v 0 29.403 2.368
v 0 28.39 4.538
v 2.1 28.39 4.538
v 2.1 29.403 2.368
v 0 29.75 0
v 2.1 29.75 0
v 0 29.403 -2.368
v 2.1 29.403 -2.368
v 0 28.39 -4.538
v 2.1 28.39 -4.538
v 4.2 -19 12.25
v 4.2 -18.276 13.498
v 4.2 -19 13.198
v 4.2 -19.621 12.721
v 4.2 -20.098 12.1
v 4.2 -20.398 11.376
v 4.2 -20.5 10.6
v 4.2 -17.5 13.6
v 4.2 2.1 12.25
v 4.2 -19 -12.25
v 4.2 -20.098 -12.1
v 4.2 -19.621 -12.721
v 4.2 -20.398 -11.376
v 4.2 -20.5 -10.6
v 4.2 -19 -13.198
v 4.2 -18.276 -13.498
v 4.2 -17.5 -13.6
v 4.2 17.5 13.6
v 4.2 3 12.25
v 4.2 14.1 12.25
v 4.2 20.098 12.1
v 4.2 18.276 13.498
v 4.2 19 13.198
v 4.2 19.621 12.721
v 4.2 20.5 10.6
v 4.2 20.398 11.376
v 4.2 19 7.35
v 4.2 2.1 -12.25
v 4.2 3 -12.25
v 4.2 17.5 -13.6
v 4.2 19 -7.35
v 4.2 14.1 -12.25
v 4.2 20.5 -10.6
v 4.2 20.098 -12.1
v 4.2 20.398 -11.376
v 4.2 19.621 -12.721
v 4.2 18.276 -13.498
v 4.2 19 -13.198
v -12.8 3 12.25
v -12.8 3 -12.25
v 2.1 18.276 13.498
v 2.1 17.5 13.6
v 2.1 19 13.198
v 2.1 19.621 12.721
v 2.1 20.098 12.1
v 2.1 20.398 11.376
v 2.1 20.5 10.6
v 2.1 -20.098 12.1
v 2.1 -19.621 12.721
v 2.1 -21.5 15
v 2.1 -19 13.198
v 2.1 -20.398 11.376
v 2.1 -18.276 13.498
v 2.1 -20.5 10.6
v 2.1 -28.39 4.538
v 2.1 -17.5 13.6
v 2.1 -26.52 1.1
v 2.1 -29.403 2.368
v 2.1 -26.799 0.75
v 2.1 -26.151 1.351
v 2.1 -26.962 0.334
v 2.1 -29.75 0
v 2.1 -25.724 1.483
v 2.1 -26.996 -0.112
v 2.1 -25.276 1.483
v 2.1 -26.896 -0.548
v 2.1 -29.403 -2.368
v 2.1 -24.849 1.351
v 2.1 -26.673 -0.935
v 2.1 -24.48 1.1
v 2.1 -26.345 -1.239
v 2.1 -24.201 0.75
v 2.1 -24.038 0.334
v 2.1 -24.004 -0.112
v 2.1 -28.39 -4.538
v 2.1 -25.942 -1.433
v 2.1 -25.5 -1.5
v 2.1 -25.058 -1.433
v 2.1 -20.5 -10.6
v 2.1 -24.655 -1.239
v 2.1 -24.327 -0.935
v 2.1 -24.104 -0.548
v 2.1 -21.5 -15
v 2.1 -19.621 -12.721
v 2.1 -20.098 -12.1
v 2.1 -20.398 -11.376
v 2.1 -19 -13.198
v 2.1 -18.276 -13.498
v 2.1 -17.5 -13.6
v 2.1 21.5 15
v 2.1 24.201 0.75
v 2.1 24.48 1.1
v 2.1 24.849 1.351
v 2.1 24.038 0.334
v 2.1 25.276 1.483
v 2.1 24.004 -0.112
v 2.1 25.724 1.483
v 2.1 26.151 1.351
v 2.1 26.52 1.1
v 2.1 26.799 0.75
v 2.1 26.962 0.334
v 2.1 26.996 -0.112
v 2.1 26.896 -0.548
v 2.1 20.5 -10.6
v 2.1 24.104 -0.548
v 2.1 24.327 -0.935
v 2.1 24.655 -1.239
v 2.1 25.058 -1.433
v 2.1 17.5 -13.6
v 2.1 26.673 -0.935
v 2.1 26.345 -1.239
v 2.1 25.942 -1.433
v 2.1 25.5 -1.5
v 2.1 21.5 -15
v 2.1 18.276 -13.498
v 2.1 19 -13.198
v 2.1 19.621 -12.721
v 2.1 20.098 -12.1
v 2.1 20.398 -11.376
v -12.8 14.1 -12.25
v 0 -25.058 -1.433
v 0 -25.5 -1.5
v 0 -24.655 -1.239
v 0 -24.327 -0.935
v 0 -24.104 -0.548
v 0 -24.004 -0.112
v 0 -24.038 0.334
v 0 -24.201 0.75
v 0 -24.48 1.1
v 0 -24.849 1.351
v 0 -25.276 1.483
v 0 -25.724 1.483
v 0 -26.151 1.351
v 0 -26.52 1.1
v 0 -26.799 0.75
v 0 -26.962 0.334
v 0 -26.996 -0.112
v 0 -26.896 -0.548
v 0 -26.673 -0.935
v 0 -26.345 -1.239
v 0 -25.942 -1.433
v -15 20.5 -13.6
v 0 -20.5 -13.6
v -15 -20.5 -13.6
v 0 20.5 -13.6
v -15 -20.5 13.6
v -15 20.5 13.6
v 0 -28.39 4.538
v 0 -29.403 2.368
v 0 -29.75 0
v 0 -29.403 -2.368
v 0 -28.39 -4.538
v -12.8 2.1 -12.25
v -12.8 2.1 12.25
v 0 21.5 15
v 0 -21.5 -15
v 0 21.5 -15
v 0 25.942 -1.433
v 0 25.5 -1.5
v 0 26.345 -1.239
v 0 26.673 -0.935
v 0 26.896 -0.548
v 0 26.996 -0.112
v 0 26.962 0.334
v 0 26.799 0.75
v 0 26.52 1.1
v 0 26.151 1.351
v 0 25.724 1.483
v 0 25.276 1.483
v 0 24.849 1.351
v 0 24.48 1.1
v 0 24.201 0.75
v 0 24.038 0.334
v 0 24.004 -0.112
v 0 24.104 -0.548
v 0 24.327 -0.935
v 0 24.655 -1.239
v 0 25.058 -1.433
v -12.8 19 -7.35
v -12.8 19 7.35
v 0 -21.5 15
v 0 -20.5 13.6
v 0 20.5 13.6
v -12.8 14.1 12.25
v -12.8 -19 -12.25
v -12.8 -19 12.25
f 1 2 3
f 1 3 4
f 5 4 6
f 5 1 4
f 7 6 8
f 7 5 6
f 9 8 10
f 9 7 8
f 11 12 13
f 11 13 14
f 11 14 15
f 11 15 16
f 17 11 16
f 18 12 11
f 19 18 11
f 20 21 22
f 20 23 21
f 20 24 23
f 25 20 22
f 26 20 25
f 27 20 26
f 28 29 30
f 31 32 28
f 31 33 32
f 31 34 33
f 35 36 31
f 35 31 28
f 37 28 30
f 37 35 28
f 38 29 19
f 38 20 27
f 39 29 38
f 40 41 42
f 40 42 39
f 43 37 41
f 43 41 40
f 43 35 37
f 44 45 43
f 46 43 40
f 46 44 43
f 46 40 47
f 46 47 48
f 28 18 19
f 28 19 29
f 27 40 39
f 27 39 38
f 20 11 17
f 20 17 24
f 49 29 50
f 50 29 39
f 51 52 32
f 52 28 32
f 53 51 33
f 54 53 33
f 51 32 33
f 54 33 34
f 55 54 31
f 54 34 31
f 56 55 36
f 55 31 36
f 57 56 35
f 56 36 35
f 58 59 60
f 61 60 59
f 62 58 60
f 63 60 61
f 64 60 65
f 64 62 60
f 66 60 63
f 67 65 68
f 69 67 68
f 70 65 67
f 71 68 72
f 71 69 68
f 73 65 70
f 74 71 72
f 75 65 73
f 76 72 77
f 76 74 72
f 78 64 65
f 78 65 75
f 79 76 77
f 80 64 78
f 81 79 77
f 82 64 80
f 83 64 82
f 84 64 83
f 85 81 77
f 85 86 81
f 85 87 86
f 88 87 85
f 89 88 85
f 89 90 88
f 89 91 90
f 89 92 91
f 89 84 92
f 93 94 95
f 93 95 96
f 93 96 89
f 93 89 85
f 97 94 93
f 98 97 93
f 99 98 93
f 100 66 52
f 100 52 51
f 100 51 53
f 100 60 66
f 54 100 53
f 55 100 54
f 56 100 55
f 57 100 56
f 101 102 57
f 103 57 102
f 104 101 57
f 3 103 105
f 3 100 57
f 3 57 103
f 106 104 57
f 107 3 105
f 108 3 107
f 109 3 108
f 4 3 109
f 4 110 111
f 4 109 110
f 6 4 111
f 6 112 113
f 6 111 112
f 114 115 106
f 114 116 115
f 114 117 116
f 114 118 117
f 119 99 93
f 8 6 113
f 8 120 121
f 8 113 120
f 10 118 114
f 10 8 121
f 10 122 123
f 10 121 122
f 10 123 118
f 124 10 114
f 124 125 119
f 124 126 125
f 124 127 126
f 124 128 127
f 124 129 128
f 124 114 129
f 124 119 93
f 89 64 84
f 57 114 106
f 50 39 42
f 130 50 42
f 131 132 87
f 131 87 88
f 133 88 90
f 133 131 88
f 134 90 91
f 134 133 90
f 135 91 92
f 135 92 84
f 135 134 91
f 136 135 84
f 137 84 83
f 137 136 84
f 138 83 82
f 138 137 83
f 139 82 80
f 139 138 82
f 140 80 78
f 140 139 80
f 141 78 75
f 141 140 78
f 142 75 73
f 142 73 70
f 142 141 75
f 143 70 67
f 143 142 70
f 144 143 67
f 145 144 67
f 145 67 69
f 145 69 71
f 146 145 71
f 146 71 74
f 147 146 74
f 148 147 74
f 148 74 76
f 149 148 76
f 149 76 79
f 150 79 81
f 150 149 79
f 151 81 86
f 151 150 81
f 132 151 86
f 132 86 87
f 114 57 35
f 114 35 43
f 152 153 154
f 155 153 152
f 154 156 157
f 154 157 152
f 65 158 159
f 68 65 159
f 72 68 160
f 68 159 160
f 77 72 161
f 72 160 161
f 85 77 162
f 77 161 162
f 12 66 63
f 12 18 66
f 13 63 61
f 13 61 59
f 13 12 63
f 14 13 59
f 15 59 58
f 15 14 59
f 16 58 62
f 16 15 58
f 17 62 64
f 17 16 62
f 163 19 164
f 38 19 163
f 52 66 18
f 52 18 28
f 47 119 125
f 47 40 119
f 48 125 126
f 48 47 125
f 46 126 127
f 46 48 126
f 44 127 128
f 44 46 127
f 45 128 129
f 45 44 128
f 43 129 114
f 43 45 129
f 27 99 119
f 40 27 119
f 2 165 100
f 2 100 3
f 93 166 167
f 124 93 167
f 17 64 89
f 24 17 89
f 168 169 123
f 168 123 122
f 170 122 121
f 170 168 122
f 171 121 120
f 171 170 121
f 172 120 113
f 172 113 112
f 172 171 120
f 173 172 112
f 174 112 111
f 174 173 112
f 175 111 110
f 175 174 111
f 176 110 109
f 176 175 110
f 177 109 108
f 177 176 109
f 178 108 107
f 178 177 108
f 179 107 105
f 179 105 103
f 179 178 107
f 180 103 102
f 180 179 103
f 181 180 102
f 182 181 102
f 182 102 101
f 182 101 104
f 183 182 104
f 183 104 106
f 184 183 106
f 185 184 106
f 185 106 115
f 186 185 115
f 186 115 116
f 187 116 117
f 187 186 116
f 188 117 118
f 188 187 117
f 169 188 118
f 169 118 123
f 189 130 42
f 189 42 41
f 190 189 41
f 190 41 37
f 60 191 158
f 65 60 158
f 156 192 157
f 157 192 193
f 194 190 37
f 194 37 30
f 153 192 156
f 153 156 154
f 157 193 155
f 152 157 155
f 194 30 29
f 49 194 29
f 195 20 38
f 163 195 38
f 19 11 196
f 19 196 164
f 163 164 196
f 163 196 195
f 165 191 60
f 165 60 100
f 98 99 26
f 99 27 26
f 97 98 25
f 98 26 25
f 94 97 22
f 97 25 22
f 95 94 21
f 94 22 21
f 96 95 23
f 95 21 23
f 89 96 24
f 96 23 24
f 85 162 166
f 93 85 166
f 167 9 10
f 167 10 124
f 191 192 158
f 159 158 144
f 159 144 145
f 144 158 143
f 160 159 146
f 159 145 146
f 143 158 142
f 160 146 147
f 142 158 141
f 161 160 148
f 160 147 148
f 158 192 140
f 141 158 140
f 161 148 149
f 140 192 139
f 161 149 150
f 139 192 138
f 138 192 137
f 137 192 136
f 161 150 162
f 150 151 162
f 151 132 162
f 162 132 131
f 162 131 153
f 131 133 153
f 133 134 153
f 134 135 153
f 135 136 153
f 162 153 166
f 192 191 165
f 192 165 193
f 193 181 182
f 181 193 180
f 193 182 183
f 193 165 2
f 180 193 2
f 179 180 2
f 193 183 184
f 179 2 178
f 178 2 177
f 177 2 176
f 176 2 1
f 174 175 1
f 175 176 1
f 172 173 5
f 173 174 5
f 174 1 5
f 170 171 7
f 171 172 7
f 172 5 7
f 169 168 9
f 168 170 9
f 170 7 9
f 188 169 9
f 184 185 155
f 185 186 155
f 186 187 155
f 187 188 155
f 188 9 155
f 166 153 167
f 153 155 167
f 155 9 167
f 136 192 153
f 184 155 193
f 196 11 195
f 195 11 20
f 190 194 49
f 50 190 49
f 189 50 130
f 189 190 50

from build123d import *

# Parameters (mm, degrees)
SKETCH1_R           = 1.5
SKETCH1_W           = 30
SKETCH1_H           = 43
SKETCH1_W_2         = 27.2
SKETCH1_H_2         = 41
SKETCH1_W_3         = 24.5
SKETCH1_H_3         = 21.1
BOSS_EXTRUDE1_DEPTH = 2.1
BOSS_EXTRUDE2_START = 2.1
SKETCH1_3_W         = 27.2
SKETCH1_3_H         = 41
SKETCH1_3_W_2       = 24.5
SKETCH1_3_H_2       = 21.1
BOSS_EXTRUDE2_DEPTH = 2.1
FILLET1_R           = 3
SKETCH1_4_W         = 27.2
SKETCH1_4_H         = 41
SKETCH1_4_W_2       = 24.5
SKETCH1_4_H_2       = 21.1
BOSS_EXTRUDE3_DEPTH = 15
BOSS_EXTRUDE4_START = -15
SKETCH1_5_W         = 24.5
SKETCH1_5_H         = 21.1
BOSS_EXTRUDE4_DEPTH = 2.2


with BuildPart() as part:
    # Sketch1 → Boss-Extrude1 (new body)
    # profile 1 of 4: a face of its own
    with BuildSketch(Plane(origin=(0, 0, 0), x_dir=(0, 0, -1), z_dir=(1, 0, 0))):
        with BuildLine():
            ThreePointArc((-4.5375, 28.390108399), (0, 29.75), (4.5375, 28.390108399))
            Line((4.5375, 28.390108399), (15, 21.5))
            Line((15, 21.5), (-15, 21.5))
            Line((-15, 21.5), (-4.5375, 28.390108399))
        make_face()
        with Locations((0, 25.5)):
            Circle(SKETCH1_R, mode=Mode.SUBTRACT)
    # profile 2 of 4: a face of its own
    with BuildSketch(Plane(origin=(0, 0, 0), x_dir=(0, 0, -1), z_dir=(1, 0, 0))):
        Rectangle(SKETCH1_W, SKETCH1_H)
        Rectangle(SKETCH1_W_2, SKETCH1_H_2, mode=Mode.SUBTRACT)
    # profile 3 of 4: a face of its own
    with BuildSketch(Plane(origin=(0, 0, 0), x_dir=(0, 0, -1), z_dir=(1, 0, 0))):
        Rectangle(SKETCH1_W_2, SKETCH1_H_2)
        Polygon((-12.25, 14.1), (-12.25, 3), (12.25, 3), (12.25, 14.1), (7.35, 19), (-7.35, 19), align=None, mode=Mode.SUBTRACT)
        with Locations((0, -8.45)):
            Rectangle(SKETCH1_W_3, SKETCH1_H_3, mode=Mode.SUBTRACT)
    # profile 4 of 4: a face of its own
    with BuildSketch(Plane(origin=(0, 0, 0), x_dir=(0, 0, -1), z_dir=(1, 0, 0))):
        with BuildLine():
            Line((-15, -21.5), (-4.5375, -28.390108399))
            ThreePointArc((-4.5375, -28.390108399), (0, -29.75), (4.5375, -28.390108399))
            Line((4.5375, -28.390108399), (15, -21.5))
            Line((15, -21.5), (-15, -21.5))
        make_face()
        with Locations((0, -25.5)):
            Circle(SKETCH1_R, mode=Mode.SUBTRACT)
    extrude(amount=BOSS_EXTRUDE1_DEPTH)

    # Sketch1<3> → Boss-Extrude2 (add)
    with BuildSketch(Plane(origin=(0, 0, 0), x_dir=(0, 0, -1), z_dir=(1, 0, 0)).offset(BOSS_EXTRUDE2_START)):
        Rectangle(SKETCH1_3_W, SKETCH1_3_H)
        Polygon((-12.25, 14.1), (-12.25, 3), (12.25, 3), (12.25, 14.1), (7.35, 19), (-7.35, 19), align=None, mode=Mode.SUBTRACT)
        with Locations((0, -8.45)):
            Rectangle(SKETCH1_3_W_2, SKETCH1_3_H_2, mode=Mode.SUBTRACT)
    extrude(amount=BOSS_EXTRUDE2_DEPTH)

    # Fillet1
    fillet1_edges = [part.edges().sort_by_distance(p)[0] for p in [
        (3.15, -20.5, 13.6),
        (3.15, -20.5, -13.6),
        (3.15, 20.5, -13.6),
        (3.15, 20.5, 13.6),
    ]]
    fillet(fillet1_edges, radius=FILLET1_R)

    # Sketch1<4> → Boss-Extrude3 (add)
    with BuildSketch(Plane(origin=(0, 0, 0), x_dir=(0, 0, -1), z_dir=(1, 0, 0))):
        Rectangle(SKETCH1_4_W, SKETCH1_4_H)
        Polygon((-12.25, 14.1), (-12.25, 3), (12.25, 3), (12.25, 14.1), (7.35, 19), (-7.35, 19), align=None, mode=Mode.SUBTRACT)
        with Locations((0, -8.45)):
            Rectangle(SKETCH1_4_W_2, SKETCH1_4_H_2, mode=Mode.SUBTRACT)
    extrude(amount=-BOSS_EXTRUDE3_DEPTH)

    # Sketch1<5> → Boss-Extrude4 (add)
    with BuildSketch(Plane(origin=(0, 0, 0), x_dir=(0, 0, -1), z_dir=(1, 0, 0)).offset(BOSS_EXTRUDE4_START)):
        Polygon((-7.35, 19), (-12.25, 14.1), (-12.25, 3), (12.25, 3), (12.25, 14.1), (7.35, 19), align=None)
        with Locations((0, -8.45)):
            Rectangle(SKETCH1_5_W, SKETCH1_5_H)
    extrude(amount=BOSS_EXTRUDE4_DEPTH)


solid = part.part
